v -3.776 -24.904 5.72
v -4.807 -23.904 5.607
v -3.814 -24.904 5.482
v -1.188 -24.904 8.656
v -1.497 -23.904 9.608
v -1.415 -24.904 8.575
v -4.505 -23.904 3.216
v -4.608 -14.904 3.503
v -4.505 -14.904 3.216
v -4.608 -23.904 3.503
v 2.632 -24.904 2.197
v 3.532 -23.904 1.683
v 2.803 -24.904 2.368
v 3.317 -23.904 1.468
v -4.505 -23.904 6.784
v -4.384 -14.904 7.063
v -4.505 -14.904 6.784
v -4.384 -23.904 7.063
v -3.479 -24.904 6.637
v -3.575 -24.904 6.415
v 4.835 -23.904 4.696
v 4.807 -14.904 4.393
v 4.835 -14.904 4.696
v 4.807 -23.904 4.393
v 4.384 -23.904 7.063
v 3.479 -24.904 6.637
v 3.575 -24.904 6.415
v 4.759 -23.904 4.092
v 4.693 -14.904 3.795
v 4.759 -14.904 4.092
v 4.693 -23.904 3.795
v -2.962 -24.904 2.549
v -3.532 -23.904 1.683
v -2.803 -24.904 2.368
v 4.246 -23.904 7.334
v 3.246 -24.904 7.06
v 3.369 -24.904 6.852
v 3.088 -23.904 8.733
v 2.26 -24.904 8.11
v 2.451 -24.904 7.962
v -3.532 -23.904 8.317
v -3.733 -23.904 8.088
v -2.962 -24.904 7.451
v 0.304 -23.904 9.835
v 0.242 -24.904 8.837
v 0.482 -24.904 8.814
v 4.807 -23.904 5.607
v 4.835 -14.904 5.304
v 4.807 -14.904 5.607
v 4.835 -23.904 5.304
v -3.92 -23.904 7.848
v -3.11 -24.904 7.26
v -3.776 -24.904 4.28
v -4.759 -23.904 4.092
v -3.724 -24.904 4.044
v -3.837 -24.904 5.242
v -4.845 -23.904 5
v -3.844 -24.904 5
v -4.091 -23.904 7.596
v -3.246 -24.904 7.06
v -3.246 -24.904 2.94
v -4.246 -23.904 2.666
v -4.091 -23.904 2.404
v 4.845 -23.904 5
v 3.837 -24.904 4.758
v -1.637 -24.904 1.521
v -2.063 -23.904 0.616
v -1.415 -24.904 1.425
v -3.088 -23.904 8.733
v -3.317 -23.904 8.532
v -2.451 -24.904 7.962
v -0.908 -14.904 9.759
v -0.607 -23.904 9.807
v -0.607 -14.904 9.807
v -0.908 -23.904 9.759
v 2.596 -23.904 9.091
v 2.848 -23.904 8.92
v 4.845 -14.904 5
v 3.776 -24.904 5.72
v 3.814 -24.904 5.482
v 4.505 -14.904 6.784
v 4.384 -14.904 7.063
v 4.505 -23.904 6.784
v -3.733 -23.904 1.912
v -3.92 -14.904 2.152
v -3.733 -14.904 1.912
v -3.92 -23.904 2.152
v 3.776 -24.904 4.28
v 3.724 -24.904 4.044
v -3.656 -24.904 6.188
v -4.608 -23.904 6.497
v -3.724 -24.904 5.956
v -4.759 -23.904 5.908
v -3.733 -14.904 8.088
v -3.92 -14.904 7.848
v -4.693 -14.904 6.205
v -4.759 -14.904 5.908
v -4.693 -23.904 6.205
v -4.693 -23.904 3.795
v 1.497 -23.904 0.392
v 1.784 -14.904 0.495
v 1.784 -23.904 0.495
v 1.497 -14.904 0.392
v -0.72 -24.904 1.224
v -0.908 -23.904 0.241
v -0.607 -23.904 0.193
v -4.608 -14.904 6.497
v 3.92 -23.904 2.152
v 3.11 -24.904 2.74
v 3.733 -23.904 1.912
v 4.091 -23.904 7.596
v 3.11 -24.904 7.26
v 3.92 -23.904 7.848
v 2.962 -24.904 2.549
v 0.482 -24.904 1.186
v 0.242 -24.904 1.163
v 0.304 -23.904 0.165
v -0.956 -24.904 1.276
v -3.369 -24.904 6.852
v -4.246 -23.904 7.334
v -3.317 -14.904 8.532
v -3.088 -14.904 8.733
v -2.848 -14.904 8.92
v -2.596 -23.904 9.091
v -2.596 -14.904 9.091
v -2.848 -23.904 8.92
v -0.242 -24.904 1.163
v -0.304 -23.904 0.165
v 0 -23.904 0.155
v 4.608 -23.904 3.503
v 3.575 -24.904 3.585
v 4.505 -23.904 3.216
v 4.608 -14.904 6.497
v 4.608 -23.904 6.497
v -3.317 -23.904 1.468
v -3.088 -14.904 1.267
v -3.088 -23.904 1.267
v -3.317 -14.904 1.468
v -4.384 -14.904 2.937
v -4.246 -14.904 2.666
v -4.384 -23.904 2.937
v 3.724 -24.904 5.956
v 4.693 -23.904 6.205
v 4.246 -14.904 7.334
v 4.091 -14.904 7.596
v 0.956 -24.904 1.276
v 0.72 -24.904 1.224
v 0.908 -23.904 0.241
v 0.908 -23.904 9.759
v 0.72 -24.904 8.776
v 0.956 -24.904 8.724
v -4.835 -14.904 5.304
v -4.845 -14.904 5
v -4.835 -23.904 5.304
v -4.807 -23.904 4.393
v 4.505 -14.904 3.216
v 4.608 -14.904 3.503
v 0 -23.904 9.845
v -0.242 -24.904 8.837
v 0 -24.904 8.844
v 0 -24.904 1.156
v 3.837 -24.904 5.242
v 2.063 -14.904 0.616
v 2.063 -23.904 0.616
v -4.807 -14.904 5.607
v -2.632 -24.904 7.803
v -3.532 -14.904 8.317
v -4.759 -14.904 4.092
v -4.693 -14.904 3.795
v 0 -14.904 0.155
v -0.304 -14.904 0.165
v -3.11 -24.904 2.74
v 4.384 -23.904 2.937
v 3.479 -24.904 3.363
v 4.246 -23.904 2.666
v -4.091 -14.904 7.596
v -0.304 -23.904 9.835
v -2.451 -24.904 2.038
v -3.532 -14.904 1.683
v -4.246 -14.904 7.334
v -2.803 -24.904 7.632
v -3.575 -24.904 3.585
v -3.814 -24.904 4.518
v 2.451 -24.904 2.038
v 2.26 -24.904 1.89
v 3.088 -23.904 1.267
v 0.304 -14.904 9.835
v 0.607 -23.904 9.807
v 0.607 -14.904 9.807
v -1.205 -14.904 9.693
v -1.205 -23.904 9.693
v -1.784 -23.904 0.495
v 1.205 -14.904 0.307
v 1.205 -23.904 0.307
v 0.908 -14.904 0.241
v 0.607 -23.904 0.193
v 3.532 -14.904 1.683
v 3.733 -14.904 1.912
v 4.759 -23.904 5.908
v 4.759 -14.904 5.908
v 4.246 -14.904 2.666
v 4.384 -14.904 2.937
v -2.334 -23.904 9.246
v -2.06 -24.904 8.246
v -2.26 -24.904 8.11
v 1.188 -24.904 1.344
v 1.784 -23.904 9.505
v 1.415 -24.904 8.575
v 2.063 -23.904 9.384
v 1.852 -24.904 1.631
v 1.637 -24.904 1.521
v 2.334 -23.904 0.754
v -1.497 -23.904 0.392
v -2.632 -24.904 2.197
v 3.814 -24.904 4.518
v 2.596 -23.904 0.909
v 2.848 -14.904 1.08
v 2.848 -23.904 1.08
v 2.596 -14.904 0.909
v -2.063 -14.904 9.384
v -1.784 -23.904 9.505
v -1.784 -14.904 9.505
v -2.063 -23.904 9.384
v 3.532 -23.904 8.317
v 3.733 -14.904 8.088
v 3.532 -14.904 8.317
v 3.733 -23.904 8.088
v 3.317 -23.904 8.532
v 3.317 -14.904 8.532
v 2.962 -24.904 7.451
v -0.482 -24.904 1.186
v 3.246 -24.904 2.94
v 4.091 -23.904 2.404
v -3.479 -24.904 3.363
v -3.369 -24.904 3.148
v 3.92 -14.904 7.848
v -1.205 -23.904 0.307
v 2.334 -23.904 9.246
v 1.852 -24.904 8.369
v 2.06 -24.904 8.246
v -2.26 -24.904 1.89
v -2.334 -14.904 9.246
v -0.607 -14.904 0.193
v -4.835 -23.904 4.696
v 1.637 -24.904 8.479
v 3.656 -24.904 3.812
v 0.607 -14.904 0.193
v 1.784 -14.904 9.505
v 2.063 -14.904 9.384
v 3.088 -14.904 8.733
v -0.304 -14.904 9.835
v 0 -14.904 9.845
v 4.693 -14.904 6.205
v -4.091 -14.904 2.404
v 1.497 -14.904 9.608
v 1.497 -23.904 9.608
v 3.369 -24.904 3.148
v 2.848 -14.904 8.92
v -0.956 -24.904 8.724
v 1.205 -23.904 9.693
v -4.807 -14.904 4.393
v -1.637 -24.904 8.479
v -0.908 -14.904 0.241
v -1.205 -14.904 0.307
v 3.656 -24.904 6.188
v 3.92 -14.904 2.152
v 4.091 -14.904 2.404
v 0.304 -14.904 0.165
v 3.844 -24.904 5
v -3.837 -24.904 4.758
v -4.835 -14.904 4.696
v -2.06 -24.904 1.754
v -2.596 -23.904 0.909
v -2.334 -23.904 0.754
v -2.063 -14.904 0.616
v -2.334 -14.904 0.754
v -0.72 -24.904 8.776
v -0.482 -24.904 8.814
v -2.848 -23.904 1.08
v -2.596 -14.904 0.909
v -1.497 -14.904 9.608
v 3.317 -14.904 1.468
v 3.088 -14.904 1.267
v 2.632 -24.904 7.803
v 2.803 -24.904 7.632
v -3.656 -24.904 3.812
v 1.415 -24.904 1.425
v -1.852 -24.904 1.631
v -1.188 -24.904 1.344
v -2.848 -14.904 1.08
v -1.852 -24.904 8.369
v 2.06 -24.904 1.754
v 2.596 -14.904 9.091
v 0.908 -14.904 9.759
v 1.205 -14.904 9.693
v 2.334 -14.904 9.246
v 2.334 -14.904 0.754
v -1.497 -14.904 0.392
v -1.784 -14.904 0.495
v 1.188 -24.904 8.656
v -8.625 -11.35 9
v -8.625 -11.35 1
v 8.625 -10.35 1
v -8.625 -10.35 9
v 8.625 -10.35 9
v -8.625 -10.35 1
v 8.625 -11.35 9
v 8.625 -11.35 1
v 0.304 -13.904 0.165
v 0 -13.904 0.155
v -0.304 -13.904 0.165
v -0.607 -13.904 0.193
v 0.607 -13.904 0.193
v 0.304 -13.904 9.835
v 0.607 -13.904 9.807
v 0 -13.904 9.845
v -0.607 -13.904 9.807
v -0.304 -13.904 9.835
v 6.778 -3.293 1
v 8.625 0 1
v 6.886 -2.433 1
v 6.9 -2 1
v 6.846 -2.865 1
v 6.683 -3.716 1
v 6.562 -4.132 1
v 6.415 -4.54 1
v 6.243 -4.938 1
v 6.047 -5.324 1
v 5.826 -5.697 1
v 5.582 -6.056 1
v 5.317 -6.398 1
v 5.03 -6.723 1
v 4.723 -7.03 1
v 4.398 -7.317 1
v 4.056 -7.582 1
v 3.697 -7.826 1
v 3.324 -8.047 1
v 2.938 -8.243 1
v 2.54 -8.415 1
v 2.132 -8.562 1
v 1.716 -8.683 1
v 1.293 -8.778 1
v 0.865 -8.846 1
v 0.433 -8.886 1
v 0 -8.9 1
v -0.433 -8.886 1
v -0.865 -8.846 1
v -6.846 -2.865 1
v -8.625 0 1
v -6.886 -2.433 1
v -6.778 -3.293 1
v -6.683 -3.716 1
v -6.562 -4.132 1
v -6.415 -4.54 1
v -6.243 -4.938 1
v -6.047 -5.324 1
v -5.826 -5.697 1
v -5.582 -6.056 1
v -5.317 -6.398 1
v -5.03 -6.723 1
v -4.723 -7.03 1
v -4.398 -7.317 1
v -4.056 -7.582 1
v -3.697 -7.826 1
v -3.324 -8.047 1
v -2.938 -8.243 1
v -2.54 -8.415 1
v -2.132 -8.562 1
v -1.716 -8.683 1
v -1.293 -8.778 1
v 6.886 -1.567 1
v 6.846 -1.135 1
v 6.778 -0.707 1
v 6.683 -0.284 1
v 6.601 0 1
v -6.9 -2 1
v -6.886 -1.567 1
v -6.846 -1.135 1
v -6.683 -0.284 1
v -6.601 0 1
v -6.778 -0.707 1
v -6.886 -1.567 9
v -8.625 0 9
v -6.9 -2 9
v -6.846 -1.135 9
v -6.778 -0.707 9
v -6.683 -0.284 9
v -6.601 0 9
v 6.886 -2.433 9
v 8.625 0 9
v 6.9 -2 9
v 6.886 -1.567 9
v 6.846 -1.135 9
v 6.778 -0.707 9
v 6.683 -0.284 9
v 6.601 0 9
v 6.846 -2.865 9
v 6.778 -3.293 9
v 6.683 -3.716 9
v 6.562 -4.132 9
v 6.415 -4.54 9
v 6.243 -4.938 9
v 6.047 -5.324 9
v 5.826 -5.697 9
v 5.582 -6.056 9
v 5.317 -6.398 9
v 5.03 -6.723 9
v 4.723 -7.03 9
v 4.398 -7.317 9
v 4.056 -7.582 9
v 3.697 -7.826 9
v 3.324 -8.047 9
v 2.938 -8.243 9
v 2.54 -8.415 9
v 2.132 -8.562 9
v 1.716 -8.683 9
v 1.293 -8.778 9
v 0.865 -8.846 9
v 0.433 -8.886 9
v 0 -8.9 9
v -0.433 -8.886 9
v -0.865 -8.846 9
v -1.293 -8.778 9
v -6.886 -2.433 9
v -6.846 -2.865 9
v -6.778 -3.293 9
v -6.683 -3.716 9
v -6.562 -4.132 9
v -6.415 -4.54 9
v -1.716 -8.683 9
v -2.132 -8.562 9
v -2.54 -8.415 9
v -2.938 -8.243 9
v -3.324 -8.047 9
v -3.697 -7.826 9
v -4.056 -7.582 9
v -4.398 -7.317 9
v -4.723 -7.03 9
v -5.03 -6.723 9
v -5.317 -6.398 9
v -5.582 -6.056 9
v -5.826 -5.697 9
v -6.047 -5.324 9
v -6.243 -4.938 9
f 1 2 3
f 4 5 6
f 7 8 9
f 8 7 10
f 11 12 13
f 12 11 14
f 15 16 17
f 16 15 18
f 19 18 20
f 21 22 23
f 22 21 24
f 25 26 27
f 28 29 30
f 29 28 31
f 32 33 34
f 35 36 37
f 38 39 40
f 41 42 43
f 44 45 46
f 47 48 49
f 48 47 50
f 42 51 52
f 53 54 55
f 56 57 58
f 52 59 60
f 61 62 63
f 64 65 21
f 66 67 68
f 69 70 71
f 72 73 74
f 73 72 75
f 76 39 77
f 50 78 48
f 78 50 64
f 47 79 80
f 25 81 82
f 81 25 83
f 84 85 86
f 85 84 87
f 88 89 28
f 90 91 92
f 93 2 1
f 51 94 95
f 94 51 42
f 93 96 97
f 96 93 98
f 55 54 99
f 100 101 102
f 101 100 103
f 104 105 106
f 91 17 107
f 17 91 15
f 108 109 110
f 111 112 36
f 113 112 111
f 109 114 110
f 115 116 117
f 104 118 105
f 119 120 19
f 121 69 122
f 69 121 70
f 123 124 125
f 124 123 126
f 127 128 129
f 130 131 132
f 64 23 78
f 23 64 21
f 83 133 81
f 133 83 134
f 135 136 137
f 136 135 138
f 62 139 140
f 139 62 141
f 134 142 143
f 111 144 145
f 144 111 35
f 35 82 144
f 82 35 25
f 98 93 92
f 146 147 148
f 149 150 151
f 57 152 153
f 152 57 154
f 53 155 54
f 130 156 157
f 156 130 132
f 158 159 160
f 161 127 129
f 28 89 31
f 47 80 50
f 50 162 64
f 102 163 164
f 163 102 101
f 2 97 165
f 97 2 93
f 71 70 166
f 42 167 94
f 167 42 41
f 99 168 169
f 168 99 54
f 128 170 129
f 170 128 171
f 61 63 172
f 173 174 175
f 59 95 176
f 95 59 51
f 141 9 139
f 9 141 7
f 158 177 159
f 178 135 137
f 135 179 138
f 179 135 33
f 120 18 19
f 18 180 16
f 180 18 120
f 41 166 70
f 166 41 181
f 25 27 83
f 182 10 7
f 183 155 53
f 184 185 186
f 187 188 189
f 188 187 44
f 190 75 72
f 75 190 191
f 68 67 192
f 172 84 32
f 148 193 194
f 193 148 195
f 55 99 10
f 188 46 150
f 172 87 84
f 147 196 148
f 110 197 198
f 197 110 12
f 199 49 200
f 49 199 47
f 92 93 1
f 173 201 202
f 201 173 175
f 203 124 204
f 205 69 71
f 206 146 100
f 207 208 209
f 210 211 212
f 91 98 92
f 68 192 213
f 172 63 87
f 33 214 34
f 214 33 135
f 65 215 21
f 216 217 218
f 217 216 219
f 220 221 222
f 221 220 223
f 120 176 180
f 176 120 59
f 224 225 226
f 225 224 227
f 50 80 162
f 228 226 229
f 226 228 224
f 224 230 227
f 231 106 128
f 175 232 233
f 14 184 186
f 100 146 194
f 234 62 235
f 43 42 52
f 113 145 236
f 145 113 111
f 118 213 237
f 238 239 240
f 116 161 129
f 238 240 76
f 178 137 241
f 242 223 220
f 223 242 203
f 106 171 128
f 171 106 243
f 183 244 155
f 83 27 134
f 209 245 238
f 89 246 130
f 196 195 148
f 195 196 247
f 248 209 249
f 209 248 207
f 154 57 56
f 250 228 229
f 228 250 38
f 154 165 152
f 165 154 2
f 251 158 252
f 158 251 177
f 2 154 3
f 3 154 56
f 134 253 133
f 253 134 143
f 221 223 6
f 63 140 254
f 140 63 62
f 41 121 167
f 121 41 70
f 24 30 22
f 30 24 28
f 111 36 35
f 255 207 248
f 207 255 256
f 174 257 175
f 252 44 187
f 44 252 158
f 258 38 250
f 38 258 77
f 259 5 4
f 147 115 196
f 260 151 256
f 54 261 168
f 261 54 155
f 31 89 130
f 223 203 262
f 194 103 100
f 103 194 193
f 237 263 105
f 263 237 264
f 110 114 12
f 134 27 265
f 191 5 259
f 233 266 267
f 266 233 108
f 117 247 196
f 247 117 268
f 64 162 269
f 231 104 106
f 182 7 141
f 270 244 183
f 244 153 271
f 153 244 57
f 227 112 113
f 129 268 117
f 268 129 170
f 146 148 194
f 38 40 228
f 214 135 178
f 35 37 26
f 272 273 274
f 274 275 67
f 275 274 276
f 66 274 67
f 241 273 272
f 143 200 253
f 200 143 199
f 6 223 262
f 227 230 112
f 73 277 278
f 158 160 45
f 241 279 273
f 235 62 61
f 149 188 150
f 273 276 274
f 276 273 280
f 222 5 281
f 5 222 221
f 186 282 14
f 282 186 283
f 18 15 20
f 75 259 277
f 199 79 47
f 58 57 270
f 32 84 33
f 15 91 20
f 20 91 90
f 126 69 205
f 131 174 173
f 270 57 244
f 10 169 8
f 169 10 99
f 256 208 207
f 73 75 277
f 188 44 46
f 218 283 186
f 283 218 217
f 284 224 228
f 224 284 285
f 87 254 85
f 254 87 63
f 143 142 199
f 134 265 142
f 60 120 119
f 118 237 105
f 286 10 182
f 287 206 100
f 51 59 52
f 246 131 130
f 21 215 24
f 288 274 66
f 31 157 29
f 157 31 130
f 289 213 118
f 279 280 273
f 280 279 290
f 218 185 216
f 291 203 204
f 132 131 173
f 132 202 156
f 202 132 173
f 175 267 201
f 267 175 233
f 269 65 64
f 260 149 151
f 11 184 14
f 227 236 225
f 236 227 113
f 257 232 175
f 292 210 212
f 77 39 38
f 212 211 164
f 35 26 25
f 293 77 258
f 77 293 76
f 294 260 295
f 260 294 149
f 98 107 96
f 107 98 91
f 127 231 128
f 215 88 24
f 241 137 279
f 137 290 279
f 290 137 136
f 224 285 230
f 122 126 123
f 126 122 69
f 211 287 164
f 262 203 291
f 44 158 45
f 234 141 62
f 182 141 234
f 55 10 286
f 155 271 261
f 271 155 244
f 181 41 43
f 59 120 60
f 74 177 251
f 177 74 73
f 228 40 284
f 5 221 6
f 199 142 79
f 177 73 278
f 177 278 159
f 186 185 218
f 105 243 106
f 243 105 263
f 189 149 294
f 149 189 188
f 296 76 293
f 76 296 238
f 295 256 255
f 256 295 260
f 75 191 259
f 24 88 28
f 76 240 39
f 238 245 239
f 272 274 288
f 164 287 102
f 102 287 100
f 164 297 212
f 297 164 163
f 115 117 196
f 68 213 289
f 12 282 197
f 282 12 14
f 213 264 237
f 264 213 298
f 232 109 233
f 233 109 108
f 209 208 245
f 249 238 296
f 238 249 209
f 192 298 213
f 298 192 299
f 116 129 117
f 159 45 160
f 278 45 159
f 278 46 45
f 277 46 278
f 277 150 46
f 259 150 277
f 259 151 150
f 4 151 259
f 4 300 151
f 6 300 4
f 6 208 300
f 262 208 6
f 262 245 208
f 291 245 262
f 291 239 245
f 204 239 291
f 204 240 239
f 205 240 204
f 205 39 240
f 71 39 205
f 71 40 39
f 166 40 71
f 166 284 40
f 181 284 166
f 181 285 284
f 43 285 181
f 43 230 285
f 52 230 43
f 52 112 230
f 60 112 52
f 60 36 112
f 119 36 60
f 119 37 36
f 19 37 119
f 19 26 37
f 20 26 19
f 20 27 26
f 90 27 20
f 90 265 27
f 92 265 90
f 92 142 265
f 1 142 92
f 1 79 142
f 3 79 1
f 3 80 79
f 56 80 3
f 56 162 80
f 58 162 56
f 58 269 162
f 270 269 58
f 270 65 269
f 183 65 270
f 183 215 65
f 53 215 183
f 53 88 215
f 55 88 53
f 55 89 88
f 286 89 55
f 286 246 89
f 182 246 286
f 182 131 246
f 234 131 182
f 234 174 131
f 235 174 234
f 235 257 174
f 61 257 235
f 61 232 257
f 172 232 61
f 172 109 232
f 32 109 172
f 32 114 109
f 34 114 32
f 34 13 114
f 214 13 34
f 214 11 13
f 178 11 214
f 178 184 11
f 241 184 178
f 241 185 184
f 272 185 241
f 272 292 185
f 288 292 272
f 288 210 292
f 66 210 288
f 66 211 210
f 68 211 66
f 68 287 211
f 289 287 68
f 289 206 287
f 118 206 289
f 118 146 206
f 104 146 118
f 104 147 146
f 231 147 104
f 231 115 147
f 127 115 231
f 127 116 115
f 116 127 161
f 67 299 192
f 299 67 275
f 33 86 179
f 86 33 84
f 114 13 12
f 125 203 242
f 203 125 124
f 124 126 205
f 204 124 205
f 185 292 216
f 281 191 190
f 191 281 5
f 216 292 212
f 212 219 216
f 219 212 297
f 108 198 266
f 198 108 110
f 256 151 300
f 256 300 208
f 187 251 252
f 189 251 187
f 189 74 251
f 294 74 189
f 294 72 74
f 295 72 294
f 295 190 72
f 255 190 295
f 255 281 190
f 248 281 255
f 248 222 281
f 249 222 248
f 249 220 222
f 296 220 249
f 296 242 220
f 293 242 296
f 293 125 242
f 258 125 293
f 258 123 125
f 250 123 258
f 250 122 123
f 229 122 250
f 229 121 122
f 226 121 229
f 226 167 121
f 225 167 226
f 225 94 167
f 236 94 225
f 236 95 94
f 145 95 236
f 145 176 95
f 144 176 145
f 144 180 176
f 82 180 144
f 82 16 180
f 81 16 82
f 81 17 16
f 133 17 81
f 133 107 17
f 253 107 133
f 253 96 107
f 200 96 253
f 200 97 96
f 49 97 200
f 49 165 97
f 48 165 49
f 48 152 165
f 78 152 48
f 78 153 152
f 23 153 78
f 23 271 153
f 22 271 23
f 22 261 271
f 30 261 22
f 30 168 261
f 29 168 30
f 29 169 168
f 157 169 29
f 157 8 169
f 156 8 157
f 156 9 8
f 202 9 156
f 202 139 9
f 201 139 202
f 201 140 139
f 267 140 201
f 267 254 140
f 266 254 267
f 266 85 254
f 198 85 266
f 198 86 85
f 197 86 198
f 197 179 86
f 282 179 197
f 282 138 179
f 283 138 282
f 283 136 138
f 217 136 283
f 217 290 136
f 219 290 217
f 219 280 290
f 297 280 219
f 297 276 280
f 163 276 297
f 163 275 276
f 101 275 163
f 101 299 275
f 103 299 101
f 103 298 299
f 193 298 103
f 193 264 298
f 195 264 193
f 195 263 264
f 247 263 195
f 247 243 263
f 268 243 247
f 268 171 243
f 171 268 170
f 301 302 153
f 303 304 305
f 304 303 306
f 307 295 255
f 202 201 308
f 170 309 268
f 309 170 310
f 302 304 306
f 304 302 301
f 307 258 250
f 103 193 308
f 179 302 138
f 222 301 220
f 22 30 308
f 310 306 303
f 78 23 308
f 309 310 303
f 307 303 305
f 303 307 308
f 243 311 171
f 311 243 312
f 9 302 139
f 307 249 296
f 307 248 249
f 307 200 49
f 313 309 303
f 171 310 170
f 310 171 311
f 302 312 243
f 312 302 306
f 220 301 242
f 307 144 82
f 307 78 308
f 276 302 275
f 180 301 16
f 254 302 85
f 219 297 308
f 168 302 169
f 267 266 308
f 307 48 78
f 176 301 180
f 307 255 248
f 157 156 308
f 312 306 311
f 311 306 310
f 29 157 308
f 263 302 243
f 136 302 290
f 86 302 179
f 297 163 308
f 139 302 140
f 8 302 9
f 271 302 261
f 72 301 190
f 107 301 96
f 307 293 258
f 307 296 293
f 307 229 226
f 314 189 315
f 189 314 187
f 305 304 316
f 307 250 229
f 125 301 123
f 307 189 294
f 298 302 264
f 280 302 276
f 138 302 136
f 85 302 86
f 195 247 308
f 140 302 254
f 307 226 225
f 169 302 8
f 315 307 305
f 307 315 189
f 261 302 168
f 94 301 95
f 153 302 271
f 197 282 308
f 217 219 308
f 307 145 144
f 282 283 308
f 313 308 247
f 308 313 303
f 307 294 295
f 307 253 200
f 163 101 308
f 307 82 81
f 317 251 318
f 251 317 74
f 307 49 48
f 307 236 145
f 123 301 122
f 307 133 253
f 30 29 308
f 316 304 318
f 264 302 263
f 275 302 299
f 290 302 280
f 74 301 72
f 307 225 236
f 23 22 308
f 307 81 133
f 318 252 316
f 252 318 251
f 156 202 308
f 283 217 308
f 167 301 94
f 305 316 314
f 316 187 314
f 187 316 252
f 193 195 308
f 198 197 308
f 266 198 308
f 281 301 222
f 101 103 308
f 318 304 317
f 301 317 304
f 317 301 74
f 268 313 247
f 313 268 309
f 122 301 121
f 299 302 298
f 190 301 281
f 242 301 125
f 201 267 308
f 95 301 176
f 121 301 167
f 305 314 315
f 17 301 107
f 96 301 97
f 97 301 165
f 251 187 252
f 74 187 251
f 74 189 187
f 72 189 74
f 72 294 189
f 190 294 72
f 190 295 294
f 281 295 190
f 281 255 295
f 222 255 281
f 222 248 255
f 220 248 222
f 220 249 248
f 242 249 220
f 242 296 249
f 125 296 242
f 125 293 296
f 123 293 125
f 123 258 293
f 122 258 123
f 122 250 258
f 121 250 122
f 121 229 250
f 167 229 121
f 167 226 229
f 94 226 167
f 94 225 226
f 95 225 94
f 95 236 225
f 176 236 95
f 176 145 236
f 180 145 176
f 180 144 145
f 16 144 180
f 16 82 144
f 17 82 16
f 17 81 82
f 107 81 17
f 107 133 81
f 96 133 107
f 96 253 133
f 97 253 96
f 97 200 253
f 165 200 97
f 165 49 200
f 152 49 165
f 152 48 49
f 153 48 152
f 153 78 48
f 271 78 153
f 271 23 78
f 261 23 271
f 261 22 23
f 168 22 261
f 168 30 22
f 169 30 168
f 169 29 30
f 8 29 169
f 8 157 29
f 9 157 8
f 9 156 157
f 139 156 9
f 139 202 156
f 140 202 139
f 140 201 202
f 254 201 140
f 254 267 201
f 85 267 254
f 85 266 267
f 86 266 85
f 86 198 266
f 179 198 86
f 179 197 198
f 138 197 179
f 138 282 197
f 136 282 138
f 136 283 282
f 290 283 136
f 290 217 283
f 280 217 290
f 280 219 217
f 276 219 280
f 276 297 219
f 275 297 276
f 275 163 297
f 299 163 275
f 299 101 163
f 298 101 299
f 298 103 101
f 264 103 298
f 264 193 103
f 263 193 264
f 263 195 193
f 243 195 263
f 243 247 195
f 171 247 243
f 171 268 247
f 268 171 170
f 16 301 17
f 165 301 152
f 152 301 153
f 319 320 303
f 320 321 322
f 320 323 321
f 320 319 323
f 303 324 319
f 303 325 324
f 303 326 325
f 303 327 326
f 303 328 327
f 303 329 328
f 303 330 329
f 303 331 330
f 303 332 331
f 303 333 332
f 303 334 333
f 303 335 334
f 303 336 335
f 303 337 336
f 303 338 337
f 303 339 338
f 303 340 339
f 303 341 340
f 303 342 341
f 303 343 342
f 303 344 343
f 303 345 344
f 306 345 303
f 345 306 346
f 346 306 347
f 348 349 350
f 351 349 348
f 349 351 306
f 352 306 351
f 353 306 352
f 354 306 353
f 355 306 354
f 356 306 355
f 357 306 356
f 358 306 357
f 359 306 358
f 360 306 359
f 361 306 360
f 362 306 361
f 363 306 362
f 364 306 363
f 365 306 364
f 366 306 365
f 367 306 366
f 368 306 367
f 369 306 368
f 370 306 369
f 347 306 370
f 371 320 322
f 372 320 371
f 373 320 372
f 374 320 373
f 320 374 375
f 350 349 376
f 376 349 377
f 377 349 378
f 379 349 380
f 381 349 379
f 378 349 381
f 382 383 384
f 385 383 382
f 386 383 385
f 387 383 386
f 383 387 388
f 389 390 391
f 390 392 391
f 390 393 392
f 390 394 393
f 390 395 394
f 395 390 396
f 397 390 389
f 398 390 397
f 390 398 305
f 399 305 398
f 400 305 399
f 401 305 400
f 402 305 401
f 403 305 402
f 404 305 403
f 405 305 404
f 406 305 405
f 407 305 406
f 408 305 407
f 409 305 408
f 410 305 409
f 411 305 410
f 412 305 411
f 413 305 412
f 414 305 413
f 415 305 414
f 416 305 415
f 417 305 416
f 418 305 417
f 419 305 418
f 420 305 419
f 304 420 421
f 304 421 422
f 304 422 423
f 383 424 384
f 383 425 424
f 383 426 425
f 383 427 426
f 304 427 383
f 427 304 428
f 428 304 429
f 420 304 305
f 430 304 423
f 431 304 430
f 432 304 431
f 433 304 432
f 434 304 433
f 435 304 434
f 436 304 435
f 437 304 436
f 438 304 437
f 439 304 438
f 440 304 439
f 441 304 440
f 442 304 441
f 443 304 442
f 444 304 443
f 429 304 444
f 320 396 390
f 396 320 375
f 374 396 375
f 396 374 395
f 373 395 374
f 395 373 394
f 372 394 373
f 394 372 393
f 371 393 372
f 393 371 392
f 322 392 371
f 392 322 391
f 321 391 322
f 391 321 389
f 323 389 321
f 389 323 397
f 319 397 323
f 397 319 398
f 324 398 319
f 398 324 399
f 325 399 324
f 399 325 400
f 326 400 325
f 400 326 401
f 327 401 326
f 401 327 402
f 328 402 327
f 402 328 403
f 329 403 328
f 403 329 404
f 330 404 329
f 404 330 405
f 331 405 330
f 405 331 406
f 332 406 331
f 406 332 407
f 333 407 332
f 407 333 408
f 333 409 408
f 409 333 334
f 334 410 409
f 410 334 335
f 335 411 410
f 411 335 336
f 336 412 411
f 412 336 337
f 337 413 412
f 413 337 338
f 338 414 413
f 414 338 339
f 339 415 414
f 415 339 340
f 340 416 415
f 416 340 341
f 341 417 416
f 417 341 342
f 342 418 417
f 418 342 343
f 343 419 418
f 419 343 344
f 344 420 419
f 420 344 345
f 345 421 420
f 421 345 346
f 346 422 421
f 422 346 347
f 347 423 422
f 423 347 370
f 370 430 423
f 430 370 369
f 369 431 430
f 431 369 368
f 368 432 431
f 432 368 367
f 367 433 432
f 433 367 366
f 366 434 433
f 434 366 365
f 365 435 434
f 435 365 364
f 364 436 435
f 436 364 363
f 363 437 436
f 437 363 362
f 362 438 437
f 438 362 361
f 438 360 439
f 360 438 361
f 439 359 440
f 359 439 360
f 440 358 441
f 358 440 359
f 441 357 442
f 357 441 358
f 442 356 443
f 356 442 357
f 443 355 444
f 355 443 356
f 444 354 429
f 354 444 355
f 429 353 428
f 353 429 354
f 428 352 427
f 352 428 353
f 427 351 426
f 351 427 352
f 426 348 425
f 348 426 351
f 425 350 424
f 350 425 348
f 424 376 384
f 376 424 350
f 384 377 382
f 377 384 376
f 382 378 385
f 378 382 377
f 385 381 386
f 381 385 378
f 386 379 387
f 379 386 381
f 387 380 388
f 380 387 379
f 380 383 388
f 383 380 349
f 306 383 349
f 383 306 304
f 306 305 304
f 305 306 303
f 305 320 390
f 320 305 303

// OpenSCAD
$fn=100;

module peg(r=5, off=-0.1, length=10, chamfer=true) {
    radius = r + off;
    if (chamfer) {
        hull() {
            translate([0,0,1])
            cylinder(r=radius, h=1);
            linear_extrude(height=1)
            offset(r=-1)
            circle(radius);
        }
        translate([0,0,2])
        cylinder(r=radius, h=length-2);
    } else {
        cylinder(r=radius, h=length);
    }

}

module kinked_peg(r=5, off=-0.1, length=10) {
    radius = r + off;
    module p(){
        hull() {
            translate([0,0,1])
            cylinder(r=radius, h=1);
            linear_extrude(height=1)
            offset(r=-1)
            circle(radius);
        }
        translate([0,0,2])
        cylinder(r=radius, h=length-2);
        translate([0,0,length])
        rotate([20,0,0])
        cylinder(r=radius, h=length-2);
    }
  
    hull()
    intersection() {
        p();
        translate([-length/2,0,length/2])
        cube([length,r*2,length]);
    }
    p();
}

//kinked_peg(r=9.5/2, off=0);

module pegtest() {
    rs=[2-.1,2.5-.1,3-.1,3.5-.1,5-.1];
    for (i = [0 : len(rs) - 1]) {
        rotate([90,0,0])
        union() {
            translate([i*20, 0, 0])
            cylinder(r=rs[i], h=20);
            translate([i*20,0,20-2.5])
            linear_extrude(height=2.5, scale=5 / rs[i])
            circle(rs[i]);
            translate([i*20 - 5, -5, 20])
            cube([10,10,10]);
        }
    }
}

module jig() {
    r = 5;
    l = 160;
    h = 160;
    x = 20;
    y = 20;

    difference() {
        translate([0, -3, 0])
        cube([l, h, 6]);  
        cube([l, h, 6]);
    }

    difference() {
        cube([l, h, 3]);  
        for (row = [0 : l/x - 2]) {
            for (col = [0: h/y - 2]) {
                translate([x * col + x, y * row + y, -5])
                //rotate([-90,0,0])
                cylinder(r=r+.1, h=15);
            }
        }
    }
}

module spool_holder_holder() {
    difference() {
        union() {
            translate([10,-10,0])
            rotate([-90,0,0])
            peg(r=9.5/2, length=10, off=0.095);
            translate([30,-10,0])
            rotate([-90,0,0])
            peg(r=9.5/2, length=10, off=0.095);
            //translate([10,0,20])
            //peg(r=9.5/2, length=10, peg_taper=0.95, off=0.25);
            //translate([30,0,20])
            //peg(r=9.5/2, length=10, peg_taper=0.95, off=0.25);
            translate([0,0,-10])
            cube([40,10,20]);
            translate([0,10,-10])
            cube([40, 20, 10]);
        }

        union() {
            translate([10,20,-10])
            cylinder(r=2.45, h=20);
            translate([30,20,-10])
            cylinder(r=2.45, h=20);
        }
    }
}

module clip(d) {
    clip_height=1;
    width = d + d * 0.25;
    depth = d * 0.75;
    thickness = 8;
    peg_length = 10;
    peg_r = 9.5/2;
    connector_size = d * 0.33;

    translate([0,-depth - peg_length - connector_size,5])

    rotate([-90,0,0])
    peg(r=9.5/2, off=0.095, length=peg_length);

    hull() {
      translate([0,-depth - connector_size,5])
      rotate([-90,0,0])
      peg(r=9.5/2, length=1, chamfer=false, off=0.095);

      translate([-width*0.5,-depth-1,clip_height])
      cube([width,1,thickness]);
    }
   
    translate([0,0,clip_height])
    linear_extrude(height=thickness)
    difference() { 

        translate([-width*0.5, -depth, 0])
        square([width,depth]);
        translate([0,-2,0])
        circle(d*0.5);
    }
}

// iron
clip(d=13.8);

// pen
//clip(d=15);

// pump
//clip(d=20);
